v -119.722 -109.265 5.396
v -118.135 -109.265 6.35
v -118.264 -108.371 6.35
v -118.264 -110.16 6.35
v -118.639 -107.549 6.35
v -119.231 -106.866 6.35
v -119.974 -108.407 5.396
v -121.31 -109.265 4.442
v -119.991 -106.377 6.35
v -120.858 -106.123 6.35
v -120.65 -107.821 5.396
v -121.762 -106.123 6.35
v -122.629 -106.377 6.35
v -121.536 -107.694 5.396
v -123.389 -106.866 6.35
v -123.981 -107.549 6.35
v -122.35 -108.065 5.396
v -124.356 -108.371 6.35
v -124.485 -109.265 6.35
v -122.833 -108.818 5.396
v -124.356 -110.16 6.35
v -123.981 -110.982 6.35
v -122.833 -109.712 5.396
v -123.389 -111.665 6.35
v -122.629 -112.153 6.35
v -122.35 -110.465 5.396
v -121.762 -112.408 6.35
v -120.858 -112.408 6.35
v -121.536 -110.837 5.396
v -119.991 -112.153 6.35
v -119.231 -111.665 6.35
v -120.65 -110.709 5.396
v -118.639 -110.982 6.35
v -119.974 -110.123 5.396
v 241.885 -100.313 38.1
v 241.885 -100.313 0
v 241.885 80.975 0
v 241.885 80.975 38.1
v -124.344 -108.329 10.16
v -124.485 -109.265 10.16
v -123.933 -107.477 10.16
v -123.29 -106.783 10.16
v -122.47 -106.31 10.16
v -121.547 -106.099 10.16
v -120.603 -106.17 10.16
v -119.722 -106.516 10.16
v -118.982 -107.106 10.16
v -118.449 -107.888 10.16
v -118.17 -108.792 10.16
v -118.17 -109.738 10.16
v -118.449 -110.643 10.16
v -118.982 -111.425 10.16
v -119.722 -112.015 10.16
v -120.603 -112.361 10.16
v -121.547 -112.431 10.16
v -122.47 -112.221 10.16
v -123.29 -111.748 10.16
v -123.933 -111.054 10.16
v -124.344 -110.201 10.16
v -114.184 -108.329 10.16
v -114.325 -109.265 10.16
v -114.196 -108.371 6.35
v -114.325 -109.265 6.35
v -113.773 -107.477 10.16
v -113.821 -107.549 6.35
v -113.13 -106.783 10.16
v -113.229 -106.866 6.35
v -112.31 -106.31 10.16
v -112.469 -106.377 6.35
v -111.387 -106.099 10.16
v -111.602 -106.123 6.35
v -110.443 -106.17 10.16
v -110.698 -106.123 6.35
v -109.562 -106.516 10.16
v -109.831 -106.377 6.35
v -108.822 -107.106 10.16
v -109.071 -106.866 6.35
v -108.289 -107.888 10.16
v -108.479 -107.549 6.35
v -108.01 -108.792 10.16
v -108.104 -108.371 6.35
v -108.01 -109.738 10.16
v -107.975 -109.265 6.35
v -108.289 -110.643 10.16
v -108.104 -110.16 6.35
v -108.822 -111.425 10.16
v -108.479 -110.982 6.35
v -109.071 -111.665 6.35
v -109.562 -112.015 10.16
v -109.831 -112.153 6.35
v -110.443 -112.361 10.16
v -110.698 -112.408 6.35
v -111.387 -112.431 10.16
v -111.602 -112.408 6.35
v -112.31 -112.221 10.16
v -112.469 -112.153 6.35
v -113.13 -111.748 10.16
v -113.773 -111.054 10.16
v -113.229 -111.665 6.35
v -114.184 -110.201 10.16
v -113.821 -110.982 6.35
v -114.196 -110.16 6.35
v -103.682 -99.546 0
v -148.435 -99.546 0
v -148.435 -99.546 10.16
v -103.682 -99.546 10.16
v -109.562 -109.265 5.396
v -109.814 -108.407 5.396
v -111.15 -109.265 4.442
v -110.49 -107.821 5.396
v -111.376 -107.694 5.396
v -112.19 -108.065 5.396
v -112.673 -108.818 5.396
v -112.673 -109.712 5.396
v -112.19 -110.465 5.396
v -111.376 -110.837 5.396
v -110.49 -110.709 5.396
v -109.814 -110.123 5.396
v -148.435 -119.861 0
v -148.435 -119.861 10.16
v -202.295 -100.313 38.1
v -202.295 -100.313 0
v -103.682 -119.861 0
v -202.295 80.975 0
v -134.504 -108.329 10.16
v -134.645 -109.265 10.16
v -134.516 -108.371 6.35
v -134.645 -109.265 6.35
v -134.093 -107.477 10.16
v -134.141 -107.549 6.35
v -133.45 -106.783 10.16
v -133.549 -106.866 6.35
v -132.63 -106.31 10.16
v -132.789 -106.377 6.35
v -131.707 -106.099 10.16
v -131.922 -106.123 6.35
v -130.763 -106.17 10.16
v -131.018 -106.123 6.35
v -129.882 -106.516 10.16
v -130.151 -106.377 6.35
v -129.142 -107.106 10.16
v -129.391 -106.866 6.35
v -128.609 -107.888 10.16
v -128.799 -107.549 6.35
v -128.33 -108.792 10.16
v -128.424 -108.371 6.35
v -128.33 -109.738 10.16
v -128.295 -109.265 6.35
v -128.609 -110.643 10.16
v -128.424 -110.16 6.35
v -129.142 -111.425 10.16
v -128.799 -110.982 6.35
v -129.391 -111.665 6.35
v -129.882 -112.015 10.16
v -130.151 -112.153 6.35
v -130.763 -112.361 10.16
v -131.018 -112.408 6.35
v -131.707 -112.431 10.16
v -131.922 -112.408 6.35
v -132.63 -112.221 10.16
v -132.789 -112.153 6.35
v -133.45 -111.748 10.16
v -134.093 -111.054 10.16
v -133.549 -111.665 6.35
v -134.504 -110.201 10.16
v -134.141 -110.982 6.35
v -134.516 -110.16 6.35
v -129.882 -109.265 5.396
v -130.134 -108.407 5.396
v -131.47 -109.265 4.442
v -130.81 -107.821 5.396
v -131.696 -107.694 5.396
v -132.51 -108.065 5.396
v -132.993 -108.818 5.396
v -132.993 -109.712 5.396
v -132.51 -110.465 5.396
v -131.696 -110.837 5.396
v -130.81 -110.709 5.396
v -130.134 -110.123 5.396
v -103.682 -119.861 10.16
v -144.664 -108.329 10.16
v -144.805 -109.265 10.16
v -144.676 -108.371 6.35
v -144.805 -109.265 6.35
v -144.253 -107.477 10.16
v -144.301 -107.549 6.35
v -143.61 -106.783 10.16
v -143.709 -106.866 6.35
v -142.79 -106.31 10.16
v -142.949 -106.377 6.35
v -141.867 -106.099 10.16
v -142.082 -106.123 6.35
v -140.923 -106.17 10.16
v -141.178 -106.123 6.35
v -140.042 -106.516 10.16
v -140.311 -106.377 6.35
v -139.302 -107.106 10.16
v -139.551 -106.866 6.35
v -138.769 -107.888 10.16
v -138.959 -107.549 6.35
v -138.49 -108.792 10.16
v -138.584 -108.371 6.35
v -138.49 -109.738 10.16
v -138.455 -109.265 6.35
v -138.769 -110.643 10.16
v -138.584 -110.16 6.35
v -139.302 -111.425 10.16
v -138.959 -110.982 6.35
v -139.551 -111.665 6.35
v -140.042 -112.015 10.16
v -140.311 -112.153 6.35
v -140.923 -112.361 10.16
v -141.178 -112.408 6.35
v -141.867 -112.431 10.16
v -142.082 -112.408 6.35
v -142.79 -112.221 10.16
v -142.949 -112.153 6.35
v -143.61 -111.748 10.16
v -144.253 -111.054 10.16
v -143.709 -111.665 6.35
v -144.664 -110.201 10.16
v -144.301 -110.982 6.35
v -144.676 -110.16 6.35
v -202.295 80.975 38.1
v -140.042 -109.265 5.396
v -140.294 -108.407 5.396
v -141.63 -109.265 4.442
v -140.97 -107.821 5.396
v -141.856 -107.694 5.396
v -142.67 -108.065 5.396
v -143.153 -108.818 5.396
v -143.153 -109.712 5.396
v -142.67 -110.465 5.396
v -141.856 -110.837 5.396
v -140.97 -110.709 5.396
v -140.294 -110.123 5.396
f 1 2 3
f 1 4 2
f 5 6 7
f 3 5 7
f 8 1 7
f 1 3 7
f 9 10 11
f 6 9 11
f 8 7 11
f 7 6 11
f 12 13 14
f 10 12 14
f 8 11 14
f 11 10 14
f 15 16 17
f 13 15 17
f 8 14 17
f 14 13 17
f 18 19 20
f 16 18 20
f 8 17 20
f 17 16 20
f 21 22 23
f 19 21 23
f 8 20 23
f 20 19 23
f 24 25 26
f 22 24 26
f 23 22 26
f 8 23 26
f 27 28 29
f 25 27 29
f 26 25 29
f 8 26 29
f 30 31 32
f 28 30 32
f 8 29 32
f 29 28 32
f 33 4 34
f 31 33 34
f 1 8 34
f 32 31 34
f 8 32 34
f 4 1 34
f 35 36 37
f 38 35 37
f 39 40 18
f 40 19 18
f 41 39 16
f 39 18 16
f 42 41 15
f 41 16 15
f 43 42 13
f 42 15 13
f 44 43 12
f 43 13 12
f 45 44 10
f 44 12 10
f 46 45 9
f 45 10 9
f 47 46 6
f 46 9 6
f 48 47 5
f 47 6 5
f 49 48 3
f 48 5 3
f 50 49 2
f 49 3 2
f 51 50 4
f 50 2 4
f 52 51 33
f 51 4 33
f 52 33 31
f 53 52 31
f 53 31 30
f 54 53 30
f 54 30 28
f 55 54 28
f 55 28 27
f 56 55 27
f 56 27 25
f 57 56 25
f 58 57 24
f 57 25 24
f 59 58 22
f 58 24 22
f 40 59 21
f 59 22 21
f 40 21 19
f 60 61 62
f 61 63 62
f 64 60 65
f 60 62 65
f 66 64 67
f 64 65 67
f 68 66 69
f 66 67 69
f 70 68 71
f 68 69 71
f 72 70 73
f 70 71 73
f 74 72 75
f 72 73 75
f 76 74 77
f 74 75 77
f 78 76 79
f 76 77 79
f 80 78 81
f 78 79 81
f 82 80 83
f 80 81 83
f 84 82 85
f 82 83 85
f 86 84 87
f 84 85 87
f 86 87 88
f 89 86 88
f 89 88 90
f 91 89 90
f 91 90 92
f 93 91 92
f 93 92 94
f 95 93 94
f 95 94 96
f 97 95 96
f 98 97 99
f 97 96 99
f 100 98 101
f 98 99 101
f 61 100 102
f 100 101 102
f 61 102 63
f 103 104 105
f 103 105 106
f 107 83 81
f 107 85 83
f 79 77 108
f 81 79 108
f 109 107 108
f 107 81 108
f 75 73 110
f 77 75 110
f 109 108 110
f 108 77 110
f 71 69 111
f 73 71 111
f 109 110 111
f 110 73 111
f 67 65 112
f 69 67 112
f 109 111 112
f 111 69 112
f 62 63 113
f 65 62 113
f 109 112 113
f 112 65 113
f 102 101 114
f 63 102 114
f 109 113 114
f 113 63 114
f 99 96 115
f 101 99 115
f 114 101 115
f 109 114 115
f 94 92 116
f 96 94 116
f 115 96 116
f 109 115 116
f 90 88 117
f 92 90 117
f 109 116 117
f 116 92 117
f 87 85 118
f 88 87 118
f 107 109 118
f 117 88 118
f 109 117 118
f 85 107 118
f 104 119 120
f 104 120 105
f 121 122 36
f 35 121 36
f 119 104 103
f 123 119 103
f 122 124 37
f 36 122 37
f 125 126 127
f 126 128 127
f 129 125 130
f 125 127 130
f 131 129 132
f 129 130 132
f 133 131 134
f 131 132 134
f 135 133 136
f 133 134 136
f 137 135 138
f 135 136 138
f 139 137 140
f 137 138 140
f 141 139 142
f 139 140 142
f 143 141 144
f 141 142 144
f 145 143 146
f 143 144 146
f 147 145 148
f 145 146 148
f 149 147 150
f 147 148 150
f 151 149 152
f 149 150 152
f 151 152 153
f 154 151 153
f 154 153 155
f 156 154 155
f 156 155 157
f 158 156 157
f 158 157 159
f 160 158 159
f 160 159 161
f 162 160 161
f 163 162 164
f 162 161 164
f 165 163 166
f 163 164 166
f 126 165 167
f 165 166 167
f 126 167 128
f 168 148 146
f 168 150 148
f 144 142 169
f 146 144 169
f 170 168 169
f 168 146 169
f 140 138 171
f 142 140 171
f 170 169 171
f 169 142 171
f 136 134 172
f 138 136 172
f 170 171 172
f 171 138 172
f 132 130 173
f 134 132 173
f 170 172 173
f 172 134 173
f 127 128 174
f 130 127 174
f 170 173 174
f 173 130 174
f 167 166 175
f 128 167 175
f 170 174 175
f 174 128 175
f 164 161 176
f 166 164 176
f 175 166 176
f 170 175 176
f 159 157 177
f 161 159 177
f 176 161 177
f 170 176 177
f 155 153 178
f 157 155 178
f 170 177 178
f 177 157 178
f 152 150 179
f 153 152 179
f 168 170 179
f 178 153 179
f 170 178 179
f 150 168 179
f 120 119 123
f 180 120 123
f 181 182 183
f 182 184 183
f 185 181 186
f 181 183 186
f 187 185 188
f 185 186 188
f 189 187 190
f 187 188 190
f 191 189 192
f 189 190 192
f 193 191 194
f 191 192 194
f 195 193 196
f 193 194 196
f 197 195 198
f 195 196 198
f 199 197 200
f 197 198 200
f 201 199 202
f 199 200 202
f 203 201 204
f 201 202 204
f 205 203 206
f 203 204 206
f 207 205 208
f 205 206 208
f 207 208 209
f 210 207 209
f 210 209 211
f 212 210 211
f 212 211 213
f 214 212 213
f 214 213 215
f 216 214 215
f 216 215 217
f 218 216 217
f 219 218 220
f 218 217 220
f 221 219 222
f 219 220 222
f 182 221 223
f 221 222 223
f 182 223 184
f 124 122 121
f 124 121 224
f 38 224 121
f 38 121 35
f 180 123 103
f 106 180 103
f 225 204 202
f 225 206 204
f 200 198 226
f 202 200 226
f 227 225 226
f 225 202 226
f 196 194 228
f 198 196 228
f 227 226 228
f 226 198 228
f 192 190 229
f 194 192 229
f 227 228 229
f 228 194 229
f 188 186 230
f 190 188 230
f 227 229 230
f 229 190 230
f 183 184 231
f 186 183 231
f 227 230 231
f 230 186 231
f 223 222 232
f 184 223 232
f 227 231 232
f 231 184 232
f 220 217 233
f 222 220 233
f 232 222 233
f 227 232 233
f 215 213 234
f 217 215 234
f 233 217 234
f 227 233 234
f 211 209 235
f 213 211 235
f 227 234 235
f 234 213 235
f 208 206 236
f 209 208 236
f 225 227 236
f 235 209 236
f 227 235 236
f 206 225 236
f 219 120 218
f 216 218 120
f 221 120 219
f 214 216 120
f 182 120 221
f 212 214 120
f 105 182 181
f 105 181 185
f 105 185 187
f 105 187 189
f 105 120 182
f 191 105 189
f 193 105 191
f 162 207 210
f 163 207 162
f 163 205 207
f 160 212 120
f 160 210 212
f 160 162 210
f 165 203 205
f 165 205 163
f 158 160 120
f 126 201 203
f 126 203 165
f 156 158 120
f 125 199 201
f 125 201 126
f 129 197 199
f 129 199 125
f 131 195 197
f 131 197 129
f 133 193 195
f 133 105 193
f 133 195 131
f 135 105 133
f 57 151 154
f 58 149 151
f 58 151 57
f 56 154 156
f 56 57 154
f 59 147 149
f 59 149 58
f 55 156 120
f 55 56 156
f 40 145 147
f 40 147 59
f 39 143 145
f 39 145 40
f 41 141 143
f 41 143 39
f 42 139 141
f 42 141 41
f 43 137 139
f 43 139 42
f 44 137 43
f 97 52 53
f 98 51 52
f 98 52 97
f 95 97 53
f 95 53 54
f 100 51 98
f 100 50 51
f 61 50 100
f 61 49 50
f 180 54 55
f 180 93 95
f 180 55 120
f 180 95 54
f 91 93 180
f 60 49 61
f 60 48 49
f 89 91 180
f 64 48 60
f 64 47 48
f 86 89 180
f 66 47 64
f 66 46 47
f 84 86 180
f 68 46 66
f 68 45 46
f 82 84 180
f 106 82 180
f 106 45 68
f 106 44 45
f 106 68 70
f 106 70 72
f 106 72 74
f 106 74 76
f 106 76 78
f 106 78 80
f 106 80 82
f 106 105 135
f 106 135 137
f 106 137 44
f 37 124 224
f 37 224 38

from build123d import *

# Parameters (mm, degrees)
F0_W     = 444.1798627377
F0_H     = 181.2878847122
F1_DEPTH = 38.1
F2_W     = 44.7529032826
F2_H     = 20.315527916
F3_DEPTH = 10.16
F5_D     = 6.35
F5_DEPTH = 3.81
F5_TIP   = 1.9077324654


with BuildPart() as f1:
    # F0 (on Top) → F1 (new body)
    with BuildSketch(Plane.XY):
        with Locations((19.7947770357, -9.6689611673)):
            Rectangle(F0_W, F0_H)
    extrude(amount=F1_DEPTH)


with BuildPart() as f3:
    # F2 (on Top) → F3 (new body)
    with BuildSketch(Plane.XY):
        with Locations((-126.058679074, -109.703451395)):
            Rectangle(F2_W, F2_H)
    extrude(amount=F3_DEPTH)

    # F5
    with Locations(Plane.XY.offset(10.16)):
        with Locations((-141.6299343109, -109.2652156949), (-131.4699343109, -109.2652156949), (-121.3099343109, -109.2652156949), (-111.1499343109, -109.2652156949)):
            Hole(F5_D / 2, depth=F5_DEPTH)
            with Locations((0, 0, -(F5_DEPTH + F5_TIP / 2))):  # 118° drill point
                Cone(0, F5_D / 2, F5_TIP, mode=Mode.SUBTRACT)


solid = Compound([f1.part, f3.part])
